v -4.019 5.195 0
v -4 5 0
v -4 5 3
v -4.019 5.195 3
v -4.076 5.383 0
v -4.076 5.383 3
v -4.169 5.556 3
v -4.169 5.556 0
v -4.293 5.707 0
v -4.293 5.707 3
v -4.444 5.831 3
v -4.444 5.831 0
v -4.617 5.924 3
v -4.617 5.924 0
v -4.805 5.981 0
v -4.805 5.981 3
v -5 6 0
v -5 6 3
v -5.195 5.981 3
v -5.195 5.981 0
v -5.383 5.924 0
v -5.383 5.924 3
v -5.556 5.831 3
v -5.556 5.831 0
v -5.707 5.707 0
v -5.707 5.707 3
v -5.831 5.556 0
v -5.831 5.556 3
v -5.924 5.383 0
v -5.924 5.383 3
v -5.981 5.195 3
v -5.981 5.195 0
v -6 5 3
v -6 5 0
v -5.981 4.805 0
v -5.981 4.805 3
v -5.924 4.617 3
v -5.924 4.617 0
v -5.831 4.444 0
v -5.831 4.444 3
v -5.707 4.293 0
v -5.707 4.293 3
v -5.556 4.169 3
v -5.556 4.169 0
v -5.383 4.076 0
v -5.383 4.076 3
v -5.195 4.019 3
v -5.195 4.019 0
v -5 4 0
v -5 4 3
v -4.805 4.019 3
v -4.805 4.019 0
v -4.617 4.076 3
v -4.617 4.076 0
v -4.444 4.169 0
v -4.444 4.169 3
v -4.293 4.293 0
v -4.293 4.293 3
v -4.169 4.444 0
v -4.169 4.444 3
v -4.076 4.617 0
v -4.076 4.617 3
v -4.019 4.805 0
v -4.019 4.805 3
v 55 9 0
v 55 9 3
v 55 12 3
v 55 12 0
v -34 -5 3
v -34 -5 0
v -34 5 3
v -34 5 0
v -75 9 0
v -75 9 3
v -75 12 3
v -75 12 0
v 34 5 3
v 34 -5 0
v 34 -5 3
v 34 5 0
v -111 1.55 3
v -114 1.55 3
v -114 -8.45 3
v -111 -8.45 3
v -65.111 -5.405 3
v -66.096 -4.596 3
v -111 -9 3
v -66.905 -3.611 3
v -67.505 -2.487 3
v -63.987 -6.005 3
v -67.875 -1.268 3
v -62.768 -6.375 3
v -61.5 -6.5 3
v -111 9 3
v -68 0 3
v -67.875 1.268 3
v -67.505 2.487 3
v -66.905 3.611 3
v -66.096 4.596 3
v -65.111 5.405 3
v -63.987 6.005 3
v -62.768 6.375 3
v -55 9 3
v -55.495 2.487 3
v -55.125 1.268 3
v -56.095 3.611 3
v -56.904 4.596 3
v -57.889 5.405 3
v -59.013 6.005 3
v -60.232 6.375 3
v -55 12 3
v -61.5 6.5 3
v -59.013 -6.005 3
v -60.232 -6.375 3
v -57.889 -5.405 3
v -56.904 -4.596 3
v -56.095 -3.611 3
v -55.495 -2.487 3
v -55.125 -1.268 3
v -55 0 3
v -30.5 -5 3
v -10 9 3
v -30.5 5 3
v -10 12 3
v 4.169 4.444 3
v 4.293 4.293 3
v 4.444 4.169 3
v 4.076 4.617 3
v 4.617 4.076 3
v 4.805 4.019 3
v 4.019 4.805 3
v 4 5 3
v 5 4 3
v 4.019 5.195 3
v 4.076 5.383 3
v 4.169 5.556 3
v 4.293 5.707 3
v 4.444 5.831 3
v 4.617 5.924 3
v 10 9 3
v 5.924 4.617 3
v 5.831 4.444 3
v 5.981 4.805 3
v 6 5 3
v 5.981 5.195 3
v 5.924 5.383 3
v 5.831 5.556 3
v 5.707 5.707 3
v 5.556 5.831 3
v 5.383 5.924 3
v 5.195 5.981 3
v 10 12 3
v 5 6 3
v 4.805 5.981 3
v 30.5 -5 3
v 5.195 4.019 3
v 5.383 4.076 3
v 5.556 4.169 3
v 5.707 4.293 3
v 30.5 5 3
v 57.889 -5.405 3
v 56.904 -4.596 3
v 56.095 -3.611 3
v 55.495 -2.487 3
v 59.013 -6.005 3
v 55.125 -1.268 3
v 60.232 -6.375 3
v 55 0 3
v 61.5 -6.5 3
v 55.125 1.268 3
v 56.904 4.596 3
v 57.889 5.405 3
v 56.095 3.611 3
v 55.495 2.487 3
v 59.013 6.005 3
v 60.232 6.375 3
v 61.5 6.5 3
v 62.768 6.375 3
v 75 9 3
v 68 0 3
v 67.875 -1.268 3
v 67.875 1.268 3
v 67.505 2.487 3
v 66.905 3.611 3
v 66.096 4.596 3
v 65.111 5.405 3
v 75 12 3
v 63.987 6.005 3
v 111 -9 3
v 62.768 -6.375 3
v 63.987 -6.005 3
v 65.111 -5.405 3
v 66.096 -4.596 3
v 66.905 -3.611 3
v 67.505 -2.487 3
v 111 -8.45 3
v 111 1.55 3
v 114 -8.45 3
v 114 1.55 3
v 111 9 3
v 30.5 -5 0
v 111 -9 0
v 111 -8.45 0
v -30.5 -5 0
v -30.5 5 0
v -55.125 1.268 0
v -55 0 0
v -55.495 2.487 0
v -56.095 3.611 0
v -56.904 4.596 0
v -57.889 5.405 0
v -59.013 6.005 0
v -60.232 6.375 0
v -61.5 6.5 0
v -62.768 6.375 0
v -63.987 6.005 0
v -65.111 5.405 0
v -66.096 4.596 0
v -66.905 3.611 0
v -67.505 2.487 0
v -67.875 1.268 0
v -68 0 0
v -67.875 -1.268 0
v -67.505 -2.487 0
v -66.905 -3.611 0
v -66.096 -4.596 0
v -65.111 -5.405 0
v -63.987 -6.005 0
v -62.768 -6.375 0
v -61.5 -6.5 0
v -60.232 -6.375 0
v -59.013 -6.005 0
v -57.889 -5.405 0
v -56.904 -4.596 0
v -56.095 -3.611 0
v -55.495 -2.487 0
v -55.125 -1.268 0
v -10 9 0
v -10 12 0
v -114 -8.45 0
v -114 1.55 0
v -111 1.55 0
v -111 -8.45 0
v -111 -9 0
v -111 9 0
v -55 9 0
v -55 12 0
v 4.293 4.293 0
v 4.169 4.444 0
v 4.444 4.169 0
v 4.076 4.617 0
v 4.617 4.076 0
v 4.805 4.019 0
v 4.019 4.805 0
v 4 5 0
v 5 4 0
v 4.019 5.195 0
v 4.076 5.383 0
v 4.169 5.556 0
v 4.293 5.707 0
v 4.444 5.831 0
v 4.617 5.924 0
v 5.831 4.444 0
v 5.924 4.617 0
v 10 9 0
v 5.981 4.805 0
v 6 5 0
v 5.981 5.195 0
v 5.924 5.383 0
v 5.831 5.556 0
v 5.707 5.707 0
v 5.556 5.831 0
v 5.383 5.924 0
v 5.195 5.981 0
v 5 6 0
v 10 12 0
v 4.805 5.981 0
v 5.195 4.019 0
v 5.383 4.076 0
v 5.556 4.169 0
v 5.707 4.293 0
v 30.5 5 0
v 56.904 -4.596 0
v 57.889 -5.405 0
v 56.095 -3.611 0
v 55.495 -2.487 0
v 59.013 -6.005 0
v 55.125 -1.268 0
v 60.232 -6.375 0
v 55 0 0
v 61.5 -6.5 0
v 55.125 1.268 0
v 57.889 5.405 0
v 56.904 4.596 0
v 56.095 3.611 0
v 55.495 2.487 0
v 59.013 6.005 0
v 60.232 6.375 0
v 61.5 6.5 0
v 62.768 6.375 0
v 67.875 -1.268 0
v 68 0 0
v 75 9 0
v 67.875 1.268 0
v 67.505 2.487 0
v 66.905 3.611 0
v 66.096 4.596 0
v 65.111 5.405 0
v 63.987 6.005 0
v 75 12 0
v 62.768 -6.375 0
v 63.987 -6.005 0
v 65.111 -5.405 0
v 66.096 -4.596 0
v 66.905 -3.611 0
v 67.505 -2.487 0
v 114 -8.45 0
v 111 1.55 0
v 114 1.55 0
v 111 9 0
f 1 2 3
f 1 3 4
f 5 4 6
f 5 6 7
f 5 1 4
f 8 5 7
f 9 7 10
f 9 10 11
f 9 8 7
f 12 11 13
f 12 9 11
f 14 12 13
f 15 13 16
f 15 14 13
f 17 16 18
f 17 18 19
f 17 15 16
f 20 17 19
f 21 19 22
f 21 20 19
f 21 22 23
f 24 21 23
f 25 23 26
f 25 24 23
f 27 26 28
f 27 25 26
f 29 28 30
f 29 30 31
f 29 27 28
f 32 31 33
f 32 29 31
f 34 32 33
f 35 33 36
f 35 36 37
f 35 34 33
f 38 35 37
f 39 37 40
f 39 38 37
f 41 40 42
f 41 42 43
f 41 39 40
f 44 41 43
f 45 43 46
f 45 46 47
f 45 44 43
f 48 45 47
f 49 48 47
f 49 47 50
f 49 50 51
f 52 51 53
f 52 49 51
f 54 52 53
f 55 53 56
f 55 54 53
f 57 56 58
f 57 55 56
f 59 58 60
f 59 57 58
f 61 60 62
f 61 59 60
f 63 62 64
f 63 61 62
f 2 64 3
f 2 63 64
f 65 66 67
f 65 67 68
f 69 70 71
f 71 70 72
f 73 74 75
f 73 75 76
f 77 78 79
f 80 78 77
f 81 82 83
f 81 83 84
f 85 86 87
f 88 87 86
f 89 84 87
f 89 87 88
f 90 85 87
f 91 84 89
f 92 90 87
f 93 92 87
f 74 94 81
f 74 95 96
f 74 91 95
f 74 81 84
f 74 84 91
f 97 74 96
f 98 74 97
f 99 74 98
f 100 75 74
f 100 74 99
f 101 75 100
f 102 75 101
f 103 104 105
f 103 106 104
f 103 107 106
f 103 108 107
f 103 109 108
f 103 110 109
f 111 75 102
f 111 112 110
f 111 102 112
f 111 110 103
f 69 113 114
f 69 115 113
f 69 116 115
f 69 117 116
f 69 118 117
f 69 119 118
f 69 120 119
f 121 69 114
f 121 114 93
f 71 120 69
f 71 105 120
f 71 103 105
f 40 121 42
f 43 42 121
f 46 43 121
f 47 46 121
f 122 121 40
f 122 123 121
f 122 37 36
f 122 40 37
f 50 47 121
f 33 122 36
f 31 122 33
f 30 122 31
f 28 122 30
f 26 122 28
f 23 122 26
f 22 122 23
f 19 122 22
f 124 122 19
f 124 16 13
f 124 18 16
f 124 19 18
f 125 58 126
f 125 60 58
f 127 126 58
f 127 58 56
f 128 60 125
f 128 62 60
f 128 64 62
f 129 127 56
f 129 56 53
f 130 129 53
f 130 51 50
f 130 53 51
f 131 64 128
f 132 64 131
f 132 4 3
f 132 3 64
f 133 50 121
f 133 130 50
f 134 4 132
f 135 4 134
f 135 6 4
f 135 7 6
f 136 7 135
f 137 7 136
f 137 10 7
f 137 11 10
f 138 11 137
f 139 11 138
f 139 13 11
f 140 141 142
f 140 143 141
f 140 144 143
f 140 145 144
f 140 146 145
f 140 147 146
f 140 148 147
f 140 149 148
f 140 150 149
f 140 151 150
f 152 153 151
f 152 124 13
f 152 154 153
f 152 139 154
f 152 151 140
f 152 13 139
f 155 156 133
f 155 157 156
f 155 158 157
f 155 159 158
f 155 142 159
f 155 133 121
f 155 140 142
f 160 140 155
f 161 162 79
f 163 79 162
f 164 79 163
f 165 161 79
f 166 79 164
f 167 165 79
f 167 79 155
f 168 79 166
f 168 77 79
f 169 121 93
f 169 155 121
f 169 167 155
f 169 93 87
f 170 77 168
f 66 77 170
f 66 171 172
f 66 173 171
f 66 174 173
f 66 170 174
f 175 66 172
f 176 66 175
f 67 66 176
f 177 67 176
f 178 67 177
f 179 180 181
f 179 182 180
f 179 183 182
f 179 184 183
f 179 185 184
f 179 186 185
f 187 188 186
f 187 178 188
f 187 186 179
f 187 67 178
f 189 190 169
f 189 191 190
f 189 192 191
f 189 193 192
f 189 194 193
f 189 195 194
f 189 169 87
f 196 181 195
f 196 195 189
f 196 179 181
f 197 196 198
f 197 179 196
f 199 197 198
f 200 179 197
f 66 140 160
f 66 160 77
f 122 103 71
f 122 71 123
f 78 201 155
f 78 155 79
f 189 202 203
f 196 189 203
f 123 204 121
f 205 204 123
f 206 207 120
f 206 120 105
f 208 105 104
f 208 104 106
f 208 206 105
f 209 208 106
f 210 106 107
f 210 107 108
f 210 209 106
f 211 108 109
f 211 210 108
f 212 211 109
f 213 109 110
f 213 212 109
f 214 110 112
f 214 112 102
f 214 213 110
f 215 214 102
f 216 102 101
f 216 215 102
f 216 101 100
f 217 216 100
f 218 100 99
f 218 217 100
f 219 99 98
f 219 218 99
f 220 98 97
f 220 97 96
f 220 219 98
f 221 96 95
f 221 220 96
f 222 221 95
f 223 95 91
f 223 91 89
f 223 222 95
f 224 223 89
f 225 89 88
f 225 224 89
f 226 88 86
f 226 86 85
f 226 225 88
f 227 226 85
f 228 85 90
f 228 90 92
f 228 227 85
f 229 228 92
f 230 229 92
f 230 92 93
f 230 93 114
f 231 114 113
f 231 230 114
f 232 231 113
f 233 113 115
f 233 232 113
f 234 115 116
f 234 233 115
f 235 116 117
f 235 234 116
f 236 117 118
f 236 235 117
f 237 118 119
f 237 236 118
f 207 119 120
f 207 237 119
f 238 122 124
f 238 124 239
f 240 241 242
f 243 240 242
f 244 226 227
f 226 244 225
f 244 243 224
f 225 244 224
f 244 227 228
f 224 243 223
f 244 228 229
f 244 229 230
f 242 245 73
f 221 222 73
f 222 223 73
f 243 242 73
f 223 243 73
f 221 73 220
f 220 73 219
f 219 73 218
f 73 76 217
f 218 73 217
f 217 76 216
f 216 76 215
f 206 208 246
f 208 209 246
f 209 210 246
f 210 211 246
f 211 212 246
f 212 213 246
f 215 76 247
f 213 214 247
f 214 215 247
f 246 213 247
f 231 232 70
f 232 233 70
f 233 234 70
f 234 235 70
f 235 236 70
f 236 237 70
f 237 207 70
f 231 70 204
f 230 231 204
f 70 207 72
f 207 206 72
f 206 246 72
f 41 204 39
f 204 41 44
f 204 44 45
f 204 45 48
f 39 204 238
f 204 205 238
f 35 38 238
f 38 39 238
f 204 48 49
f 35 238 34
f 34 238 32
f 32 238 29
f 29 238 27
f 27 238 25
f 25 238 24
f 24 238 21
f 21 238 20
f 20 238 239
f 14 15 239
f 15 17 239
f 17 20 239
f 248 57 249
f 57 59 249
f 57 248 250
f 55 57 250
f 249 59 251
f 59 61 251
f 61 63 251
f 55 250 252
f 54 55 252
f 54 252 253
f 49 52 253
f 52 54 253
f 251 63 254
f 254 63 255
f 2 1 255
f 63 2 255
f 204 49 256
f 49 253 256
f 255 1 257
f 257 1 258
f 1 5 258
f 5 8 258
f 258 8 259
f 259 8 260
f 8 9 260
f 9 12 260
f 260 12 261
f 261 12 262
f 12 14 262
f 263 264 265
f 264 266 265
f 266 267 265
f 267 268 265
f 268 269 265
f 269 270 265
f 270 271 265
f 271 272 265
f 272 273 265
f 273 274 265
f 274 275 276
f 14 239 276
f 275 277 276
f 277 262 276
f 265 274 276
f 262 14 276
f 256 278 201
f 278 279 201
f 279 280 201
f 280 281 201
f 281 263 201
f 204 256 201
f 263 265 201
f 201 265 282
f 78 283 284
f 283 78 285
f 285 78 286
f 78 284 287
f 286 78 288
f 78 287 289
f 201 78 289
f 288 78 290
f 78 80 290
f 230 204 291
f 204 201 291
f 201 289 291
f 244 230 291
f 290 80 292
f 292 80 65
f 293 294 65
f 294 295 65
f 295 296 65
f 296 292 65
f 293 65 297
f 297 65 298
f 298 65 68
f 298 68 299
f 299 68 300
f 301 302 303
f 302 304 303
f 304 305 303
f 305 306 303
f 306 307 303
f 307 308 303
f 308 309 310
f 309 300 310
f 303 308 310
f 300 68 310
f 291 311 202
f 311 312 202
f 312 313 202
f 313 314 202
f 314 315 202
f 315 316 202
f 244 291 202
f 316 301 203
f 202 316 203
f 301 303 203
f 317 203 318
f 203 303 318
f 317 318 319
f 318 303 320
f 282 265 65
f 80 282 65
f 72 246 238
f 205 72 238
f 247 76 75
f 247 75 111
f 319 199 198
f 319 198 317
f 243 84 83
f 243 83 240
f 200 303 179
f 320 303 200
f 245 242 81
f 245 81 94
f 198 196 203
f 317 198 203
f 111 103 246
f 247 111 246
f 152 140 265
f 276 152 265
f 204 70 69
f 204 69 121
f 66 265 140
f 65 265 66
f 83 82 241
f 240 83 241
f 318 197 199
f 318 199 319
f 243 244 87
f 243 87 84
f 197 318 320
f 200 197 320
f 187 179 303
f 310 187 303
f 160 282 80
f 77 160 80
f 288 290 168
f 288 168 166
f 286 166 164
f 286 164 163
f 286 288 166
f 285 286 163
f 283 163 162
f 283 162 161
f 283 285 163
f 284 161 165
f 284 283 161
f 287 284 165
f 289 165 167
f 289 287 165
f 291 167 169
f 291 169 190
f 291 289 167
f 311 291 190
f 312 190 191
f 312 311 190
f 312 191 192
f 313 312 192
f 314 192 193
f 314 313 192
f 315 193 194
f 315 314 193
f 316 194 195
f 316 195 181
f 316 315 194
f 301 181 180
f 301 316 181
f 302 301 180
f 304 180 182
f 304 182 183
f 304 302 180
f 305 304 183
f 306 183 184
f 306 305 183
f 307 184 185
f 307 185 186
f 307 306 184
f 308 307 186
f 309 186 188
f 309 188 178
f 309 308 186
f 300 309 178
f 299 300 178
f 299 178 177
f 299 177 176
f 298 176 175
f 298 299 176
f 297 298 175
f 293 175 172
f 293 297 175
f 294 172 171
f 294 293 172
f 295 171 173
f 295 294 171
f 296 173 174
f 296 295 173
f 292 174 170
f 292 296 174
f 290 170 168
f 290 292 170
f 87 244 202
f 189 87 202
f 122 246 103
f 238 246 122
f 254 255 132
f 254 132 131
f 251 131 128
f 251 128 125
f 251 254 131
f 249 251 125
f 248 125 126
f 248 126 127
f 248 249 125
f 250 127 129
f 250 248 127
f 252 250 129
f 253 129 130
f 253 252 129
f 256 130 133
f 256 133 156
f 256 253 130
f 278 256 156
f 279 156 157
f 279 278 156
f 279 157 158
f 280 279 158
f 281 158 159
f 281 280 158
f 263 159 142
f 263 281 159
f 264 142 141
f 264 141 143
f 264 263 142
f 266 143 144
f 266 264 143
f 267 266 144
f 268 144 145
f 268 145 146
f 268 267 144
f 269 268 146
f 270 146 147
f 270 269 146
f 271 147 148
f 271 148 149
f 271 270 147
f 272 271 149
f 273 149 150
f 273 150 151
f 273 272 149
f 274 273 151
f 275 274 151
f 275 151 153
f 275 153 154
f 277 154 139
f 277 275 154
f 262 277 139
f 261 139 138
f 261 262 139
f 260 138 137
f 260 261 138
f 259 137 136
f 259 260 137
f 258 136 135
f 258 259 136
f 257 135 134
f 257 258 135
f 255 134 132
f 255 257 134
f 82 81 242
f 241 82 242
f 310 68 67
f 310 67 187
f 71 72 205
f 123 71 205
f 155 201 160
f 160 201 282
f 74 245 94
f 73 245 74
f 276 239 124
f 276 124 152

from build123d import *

# Parameters (mm, degrees)
CROQUIS1_W              = 222
CROQUIS1_H              = 18
CROQUIS1_R              = 1
CROQUIS1_R_2            = 6.5
CROQUIS1_W_2            = 3.5
CROQUIS1_H_2            = 10
SALIENTE_EXTRUIR1_DEPTH = 3
CROQUIS2_W              = 20
CROQUIS2_H              = 3
SALIENTE_EXTRUIR2_DEPTH = 3
CROQUIS3_W              = 3
CROQUIS3_H              = 10
SALIENTE_EXTRUIR3_DEPTH = 3


with BuildPart() as part:
    # Croquis1 → Saliente-Extruir1 (new body)
    with BuildSketch(Plane.XY):
        Rectangle(CROQUIS1_W, CROQUIS1_H)
        with Locations((-5, 5)):
            Circle(CROQUIS1_R, mode=Mode.SUBTRACT)
        with Locations(Location((5, 5, 0), (0, 0, 180))):
            Circle(CROQUIS1_R, mode=Mode.SUBTRACT)
        with Locations((-61.5, 0)):
            Circle(CROQUIS1_R_2, mode=Mode.SUBTRACT)
        with Locations(Location((61.5, 0, 0), (0, 0, 180))):
            Circle(CROQUIS1_R_2, mode=Mode.SUBTRACT)
        with Locations((32.25, 0)):
            Rectangle(CROQUIS1_W_2, CROQUIS1_H_2, mode=Mode.SUBTRACT)
        with Locations((-32.25, 0)):
            Rectangle(CROQUIS1_W_2, CROQUIS1_H_2, mode=Mode.SUBTRACT)
    extrude(amount=SALIENTE_EXTRUIR1_DEPTH)

    # Croquis2 → Saliente-Extruir2 (add)
    with BuildSketch(Plane(origin=(0, 9, 0), x_dir=(1, 0, 0), z_dir=(0, 1, 0))):
        with Locations((-65, -1.5)):
            Rectangle(CROQUIS2_W, CROQUIS2_H)
        with Locations((0, -1.5)):
            Rectangle(CROQUIS2_W, CROQUIS2_H)
        with Locations((65, -1.5)):
            Rectangle(CROQUIS2_W, CROQUIS2_H)
    extrude(amount=SALIENTE_EXTRUIR2_DEPTH)

    # Croquis3 → Saliente-Extruir3 (add)
    with BuildSketch(Plane(origin=(111, 0, 0), x_dir=(0, 0, -1), z_dir=(1, 0, 0))):
        with Locations((-1.5, -3.45)):
            Rectangle(CROQUIS3_W, CROQUIS3_H)
    saliente_extruir3 = extrude(amount=SALIENTE_EXTRUIR3_DEPTH)

    # Simetría1: Saliente-Extruir3 across plane
    add(saliente_extruir3.mirror(Plane(origin=(0, 0, 0), x_dir=(0, 0, 1), z_dir=(1, 0, 0))))


solid = part.part
